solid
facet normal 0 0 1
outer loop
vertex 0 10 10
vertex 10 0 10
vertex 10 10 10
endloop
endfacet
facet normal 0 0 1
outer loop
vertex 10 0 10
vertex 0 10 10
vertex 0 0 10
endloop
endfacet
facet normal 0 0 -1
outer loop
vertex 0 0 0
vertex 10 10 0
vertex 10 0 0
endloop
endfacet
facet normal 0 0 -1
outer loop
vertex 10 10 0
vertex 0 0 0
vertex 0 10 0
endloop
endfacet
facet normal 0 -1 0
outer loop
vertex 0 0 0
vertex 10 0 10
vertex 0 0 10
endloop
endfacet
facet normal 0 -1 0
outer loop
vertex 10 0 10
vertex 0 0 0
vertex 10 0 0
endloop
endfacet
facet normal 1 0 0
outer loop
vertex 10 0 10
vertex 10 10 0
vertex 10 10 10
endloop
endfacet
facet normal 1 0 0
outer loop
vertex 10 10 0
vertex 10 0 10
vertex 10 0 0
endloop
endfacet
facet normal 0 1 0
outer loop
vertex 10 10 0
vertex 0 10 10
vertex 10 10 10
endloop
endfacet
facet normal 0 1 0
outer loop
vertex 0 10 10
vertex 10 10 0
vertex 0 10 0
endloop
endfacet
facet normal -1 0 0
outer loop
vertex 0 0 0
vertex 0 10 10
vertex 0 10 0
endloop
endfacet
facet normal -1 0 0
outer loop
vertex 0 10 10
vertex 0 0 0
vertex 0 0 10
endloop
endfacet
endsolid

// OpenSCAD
// Test file for hover behavior with comments
// This is a comment with the word "email" in it - should not show hover
/* This is a block comment with "email" inside - should not show hover */

/* [Wi-Fi Type] */
// Group comment above - hovering over "Wi-Fi Type" should show @group hover

/* [Network Settings] */
// Another group comment - hovering over "Network Settings" should show @group hover

// email address configuration
email = "test@example.org"; // This variable should show hover when hovering over "email"

// width of the cube
width = 10; // The word "width" here should show hover

/* [Device Configuration] */
// Group comment - hovering over "Device Configuration" should show @group hover

/*
  Multi-line comment block
  with the word "email" inside - should not show hover
  and also "width" - should not show hover
*/

module test_module(email = "default@example.com") {
    // Parameter email usage - this should show hover
    echo(email);
    
    // Comment mentioning email - should not show hover
    cube([width, width, width]);
}

// Test single line comment with email and width - neither should show hover
test_module();

// Test case for comma handling in variable values
city = "San Francisco";  // Valid variable declaration
coordinates = [1, 2, 3];  // Valid array declaration
message = str("Hello", ", ", "World");  // Valid function call with commas

// Test module with comma-separated parameters (where the original issue occurred)
module test_comma_params(
    city = "Default City",
    region = "Default Region", 
    postalcode = "00000"
) {
    echo(city, region, postalcode);
}

// Variables for testing multi-line parameter detection
first_name = "John";
last_name = "Doe"; 
phone_number = "555-1234";

// Test multi-line function call parameter detection (like the original qr_wifi example)
module create_vcard() {
    message = custom_vcard(
        first=first_name,      // Should show parameter hover for 'first', not variable hover
        last=last_name,        // Should show parameter hover for 'last'  
        phone=phone_number     // Should show parameter hover for 'phone'
    );
    echo(message);
}

// Test with a user-defined module that spans multiple lines
module custom_vcard(first="", last="", phone="") {
    str("Name: ", first, " ", last, " Phone: ", phone);
} 
